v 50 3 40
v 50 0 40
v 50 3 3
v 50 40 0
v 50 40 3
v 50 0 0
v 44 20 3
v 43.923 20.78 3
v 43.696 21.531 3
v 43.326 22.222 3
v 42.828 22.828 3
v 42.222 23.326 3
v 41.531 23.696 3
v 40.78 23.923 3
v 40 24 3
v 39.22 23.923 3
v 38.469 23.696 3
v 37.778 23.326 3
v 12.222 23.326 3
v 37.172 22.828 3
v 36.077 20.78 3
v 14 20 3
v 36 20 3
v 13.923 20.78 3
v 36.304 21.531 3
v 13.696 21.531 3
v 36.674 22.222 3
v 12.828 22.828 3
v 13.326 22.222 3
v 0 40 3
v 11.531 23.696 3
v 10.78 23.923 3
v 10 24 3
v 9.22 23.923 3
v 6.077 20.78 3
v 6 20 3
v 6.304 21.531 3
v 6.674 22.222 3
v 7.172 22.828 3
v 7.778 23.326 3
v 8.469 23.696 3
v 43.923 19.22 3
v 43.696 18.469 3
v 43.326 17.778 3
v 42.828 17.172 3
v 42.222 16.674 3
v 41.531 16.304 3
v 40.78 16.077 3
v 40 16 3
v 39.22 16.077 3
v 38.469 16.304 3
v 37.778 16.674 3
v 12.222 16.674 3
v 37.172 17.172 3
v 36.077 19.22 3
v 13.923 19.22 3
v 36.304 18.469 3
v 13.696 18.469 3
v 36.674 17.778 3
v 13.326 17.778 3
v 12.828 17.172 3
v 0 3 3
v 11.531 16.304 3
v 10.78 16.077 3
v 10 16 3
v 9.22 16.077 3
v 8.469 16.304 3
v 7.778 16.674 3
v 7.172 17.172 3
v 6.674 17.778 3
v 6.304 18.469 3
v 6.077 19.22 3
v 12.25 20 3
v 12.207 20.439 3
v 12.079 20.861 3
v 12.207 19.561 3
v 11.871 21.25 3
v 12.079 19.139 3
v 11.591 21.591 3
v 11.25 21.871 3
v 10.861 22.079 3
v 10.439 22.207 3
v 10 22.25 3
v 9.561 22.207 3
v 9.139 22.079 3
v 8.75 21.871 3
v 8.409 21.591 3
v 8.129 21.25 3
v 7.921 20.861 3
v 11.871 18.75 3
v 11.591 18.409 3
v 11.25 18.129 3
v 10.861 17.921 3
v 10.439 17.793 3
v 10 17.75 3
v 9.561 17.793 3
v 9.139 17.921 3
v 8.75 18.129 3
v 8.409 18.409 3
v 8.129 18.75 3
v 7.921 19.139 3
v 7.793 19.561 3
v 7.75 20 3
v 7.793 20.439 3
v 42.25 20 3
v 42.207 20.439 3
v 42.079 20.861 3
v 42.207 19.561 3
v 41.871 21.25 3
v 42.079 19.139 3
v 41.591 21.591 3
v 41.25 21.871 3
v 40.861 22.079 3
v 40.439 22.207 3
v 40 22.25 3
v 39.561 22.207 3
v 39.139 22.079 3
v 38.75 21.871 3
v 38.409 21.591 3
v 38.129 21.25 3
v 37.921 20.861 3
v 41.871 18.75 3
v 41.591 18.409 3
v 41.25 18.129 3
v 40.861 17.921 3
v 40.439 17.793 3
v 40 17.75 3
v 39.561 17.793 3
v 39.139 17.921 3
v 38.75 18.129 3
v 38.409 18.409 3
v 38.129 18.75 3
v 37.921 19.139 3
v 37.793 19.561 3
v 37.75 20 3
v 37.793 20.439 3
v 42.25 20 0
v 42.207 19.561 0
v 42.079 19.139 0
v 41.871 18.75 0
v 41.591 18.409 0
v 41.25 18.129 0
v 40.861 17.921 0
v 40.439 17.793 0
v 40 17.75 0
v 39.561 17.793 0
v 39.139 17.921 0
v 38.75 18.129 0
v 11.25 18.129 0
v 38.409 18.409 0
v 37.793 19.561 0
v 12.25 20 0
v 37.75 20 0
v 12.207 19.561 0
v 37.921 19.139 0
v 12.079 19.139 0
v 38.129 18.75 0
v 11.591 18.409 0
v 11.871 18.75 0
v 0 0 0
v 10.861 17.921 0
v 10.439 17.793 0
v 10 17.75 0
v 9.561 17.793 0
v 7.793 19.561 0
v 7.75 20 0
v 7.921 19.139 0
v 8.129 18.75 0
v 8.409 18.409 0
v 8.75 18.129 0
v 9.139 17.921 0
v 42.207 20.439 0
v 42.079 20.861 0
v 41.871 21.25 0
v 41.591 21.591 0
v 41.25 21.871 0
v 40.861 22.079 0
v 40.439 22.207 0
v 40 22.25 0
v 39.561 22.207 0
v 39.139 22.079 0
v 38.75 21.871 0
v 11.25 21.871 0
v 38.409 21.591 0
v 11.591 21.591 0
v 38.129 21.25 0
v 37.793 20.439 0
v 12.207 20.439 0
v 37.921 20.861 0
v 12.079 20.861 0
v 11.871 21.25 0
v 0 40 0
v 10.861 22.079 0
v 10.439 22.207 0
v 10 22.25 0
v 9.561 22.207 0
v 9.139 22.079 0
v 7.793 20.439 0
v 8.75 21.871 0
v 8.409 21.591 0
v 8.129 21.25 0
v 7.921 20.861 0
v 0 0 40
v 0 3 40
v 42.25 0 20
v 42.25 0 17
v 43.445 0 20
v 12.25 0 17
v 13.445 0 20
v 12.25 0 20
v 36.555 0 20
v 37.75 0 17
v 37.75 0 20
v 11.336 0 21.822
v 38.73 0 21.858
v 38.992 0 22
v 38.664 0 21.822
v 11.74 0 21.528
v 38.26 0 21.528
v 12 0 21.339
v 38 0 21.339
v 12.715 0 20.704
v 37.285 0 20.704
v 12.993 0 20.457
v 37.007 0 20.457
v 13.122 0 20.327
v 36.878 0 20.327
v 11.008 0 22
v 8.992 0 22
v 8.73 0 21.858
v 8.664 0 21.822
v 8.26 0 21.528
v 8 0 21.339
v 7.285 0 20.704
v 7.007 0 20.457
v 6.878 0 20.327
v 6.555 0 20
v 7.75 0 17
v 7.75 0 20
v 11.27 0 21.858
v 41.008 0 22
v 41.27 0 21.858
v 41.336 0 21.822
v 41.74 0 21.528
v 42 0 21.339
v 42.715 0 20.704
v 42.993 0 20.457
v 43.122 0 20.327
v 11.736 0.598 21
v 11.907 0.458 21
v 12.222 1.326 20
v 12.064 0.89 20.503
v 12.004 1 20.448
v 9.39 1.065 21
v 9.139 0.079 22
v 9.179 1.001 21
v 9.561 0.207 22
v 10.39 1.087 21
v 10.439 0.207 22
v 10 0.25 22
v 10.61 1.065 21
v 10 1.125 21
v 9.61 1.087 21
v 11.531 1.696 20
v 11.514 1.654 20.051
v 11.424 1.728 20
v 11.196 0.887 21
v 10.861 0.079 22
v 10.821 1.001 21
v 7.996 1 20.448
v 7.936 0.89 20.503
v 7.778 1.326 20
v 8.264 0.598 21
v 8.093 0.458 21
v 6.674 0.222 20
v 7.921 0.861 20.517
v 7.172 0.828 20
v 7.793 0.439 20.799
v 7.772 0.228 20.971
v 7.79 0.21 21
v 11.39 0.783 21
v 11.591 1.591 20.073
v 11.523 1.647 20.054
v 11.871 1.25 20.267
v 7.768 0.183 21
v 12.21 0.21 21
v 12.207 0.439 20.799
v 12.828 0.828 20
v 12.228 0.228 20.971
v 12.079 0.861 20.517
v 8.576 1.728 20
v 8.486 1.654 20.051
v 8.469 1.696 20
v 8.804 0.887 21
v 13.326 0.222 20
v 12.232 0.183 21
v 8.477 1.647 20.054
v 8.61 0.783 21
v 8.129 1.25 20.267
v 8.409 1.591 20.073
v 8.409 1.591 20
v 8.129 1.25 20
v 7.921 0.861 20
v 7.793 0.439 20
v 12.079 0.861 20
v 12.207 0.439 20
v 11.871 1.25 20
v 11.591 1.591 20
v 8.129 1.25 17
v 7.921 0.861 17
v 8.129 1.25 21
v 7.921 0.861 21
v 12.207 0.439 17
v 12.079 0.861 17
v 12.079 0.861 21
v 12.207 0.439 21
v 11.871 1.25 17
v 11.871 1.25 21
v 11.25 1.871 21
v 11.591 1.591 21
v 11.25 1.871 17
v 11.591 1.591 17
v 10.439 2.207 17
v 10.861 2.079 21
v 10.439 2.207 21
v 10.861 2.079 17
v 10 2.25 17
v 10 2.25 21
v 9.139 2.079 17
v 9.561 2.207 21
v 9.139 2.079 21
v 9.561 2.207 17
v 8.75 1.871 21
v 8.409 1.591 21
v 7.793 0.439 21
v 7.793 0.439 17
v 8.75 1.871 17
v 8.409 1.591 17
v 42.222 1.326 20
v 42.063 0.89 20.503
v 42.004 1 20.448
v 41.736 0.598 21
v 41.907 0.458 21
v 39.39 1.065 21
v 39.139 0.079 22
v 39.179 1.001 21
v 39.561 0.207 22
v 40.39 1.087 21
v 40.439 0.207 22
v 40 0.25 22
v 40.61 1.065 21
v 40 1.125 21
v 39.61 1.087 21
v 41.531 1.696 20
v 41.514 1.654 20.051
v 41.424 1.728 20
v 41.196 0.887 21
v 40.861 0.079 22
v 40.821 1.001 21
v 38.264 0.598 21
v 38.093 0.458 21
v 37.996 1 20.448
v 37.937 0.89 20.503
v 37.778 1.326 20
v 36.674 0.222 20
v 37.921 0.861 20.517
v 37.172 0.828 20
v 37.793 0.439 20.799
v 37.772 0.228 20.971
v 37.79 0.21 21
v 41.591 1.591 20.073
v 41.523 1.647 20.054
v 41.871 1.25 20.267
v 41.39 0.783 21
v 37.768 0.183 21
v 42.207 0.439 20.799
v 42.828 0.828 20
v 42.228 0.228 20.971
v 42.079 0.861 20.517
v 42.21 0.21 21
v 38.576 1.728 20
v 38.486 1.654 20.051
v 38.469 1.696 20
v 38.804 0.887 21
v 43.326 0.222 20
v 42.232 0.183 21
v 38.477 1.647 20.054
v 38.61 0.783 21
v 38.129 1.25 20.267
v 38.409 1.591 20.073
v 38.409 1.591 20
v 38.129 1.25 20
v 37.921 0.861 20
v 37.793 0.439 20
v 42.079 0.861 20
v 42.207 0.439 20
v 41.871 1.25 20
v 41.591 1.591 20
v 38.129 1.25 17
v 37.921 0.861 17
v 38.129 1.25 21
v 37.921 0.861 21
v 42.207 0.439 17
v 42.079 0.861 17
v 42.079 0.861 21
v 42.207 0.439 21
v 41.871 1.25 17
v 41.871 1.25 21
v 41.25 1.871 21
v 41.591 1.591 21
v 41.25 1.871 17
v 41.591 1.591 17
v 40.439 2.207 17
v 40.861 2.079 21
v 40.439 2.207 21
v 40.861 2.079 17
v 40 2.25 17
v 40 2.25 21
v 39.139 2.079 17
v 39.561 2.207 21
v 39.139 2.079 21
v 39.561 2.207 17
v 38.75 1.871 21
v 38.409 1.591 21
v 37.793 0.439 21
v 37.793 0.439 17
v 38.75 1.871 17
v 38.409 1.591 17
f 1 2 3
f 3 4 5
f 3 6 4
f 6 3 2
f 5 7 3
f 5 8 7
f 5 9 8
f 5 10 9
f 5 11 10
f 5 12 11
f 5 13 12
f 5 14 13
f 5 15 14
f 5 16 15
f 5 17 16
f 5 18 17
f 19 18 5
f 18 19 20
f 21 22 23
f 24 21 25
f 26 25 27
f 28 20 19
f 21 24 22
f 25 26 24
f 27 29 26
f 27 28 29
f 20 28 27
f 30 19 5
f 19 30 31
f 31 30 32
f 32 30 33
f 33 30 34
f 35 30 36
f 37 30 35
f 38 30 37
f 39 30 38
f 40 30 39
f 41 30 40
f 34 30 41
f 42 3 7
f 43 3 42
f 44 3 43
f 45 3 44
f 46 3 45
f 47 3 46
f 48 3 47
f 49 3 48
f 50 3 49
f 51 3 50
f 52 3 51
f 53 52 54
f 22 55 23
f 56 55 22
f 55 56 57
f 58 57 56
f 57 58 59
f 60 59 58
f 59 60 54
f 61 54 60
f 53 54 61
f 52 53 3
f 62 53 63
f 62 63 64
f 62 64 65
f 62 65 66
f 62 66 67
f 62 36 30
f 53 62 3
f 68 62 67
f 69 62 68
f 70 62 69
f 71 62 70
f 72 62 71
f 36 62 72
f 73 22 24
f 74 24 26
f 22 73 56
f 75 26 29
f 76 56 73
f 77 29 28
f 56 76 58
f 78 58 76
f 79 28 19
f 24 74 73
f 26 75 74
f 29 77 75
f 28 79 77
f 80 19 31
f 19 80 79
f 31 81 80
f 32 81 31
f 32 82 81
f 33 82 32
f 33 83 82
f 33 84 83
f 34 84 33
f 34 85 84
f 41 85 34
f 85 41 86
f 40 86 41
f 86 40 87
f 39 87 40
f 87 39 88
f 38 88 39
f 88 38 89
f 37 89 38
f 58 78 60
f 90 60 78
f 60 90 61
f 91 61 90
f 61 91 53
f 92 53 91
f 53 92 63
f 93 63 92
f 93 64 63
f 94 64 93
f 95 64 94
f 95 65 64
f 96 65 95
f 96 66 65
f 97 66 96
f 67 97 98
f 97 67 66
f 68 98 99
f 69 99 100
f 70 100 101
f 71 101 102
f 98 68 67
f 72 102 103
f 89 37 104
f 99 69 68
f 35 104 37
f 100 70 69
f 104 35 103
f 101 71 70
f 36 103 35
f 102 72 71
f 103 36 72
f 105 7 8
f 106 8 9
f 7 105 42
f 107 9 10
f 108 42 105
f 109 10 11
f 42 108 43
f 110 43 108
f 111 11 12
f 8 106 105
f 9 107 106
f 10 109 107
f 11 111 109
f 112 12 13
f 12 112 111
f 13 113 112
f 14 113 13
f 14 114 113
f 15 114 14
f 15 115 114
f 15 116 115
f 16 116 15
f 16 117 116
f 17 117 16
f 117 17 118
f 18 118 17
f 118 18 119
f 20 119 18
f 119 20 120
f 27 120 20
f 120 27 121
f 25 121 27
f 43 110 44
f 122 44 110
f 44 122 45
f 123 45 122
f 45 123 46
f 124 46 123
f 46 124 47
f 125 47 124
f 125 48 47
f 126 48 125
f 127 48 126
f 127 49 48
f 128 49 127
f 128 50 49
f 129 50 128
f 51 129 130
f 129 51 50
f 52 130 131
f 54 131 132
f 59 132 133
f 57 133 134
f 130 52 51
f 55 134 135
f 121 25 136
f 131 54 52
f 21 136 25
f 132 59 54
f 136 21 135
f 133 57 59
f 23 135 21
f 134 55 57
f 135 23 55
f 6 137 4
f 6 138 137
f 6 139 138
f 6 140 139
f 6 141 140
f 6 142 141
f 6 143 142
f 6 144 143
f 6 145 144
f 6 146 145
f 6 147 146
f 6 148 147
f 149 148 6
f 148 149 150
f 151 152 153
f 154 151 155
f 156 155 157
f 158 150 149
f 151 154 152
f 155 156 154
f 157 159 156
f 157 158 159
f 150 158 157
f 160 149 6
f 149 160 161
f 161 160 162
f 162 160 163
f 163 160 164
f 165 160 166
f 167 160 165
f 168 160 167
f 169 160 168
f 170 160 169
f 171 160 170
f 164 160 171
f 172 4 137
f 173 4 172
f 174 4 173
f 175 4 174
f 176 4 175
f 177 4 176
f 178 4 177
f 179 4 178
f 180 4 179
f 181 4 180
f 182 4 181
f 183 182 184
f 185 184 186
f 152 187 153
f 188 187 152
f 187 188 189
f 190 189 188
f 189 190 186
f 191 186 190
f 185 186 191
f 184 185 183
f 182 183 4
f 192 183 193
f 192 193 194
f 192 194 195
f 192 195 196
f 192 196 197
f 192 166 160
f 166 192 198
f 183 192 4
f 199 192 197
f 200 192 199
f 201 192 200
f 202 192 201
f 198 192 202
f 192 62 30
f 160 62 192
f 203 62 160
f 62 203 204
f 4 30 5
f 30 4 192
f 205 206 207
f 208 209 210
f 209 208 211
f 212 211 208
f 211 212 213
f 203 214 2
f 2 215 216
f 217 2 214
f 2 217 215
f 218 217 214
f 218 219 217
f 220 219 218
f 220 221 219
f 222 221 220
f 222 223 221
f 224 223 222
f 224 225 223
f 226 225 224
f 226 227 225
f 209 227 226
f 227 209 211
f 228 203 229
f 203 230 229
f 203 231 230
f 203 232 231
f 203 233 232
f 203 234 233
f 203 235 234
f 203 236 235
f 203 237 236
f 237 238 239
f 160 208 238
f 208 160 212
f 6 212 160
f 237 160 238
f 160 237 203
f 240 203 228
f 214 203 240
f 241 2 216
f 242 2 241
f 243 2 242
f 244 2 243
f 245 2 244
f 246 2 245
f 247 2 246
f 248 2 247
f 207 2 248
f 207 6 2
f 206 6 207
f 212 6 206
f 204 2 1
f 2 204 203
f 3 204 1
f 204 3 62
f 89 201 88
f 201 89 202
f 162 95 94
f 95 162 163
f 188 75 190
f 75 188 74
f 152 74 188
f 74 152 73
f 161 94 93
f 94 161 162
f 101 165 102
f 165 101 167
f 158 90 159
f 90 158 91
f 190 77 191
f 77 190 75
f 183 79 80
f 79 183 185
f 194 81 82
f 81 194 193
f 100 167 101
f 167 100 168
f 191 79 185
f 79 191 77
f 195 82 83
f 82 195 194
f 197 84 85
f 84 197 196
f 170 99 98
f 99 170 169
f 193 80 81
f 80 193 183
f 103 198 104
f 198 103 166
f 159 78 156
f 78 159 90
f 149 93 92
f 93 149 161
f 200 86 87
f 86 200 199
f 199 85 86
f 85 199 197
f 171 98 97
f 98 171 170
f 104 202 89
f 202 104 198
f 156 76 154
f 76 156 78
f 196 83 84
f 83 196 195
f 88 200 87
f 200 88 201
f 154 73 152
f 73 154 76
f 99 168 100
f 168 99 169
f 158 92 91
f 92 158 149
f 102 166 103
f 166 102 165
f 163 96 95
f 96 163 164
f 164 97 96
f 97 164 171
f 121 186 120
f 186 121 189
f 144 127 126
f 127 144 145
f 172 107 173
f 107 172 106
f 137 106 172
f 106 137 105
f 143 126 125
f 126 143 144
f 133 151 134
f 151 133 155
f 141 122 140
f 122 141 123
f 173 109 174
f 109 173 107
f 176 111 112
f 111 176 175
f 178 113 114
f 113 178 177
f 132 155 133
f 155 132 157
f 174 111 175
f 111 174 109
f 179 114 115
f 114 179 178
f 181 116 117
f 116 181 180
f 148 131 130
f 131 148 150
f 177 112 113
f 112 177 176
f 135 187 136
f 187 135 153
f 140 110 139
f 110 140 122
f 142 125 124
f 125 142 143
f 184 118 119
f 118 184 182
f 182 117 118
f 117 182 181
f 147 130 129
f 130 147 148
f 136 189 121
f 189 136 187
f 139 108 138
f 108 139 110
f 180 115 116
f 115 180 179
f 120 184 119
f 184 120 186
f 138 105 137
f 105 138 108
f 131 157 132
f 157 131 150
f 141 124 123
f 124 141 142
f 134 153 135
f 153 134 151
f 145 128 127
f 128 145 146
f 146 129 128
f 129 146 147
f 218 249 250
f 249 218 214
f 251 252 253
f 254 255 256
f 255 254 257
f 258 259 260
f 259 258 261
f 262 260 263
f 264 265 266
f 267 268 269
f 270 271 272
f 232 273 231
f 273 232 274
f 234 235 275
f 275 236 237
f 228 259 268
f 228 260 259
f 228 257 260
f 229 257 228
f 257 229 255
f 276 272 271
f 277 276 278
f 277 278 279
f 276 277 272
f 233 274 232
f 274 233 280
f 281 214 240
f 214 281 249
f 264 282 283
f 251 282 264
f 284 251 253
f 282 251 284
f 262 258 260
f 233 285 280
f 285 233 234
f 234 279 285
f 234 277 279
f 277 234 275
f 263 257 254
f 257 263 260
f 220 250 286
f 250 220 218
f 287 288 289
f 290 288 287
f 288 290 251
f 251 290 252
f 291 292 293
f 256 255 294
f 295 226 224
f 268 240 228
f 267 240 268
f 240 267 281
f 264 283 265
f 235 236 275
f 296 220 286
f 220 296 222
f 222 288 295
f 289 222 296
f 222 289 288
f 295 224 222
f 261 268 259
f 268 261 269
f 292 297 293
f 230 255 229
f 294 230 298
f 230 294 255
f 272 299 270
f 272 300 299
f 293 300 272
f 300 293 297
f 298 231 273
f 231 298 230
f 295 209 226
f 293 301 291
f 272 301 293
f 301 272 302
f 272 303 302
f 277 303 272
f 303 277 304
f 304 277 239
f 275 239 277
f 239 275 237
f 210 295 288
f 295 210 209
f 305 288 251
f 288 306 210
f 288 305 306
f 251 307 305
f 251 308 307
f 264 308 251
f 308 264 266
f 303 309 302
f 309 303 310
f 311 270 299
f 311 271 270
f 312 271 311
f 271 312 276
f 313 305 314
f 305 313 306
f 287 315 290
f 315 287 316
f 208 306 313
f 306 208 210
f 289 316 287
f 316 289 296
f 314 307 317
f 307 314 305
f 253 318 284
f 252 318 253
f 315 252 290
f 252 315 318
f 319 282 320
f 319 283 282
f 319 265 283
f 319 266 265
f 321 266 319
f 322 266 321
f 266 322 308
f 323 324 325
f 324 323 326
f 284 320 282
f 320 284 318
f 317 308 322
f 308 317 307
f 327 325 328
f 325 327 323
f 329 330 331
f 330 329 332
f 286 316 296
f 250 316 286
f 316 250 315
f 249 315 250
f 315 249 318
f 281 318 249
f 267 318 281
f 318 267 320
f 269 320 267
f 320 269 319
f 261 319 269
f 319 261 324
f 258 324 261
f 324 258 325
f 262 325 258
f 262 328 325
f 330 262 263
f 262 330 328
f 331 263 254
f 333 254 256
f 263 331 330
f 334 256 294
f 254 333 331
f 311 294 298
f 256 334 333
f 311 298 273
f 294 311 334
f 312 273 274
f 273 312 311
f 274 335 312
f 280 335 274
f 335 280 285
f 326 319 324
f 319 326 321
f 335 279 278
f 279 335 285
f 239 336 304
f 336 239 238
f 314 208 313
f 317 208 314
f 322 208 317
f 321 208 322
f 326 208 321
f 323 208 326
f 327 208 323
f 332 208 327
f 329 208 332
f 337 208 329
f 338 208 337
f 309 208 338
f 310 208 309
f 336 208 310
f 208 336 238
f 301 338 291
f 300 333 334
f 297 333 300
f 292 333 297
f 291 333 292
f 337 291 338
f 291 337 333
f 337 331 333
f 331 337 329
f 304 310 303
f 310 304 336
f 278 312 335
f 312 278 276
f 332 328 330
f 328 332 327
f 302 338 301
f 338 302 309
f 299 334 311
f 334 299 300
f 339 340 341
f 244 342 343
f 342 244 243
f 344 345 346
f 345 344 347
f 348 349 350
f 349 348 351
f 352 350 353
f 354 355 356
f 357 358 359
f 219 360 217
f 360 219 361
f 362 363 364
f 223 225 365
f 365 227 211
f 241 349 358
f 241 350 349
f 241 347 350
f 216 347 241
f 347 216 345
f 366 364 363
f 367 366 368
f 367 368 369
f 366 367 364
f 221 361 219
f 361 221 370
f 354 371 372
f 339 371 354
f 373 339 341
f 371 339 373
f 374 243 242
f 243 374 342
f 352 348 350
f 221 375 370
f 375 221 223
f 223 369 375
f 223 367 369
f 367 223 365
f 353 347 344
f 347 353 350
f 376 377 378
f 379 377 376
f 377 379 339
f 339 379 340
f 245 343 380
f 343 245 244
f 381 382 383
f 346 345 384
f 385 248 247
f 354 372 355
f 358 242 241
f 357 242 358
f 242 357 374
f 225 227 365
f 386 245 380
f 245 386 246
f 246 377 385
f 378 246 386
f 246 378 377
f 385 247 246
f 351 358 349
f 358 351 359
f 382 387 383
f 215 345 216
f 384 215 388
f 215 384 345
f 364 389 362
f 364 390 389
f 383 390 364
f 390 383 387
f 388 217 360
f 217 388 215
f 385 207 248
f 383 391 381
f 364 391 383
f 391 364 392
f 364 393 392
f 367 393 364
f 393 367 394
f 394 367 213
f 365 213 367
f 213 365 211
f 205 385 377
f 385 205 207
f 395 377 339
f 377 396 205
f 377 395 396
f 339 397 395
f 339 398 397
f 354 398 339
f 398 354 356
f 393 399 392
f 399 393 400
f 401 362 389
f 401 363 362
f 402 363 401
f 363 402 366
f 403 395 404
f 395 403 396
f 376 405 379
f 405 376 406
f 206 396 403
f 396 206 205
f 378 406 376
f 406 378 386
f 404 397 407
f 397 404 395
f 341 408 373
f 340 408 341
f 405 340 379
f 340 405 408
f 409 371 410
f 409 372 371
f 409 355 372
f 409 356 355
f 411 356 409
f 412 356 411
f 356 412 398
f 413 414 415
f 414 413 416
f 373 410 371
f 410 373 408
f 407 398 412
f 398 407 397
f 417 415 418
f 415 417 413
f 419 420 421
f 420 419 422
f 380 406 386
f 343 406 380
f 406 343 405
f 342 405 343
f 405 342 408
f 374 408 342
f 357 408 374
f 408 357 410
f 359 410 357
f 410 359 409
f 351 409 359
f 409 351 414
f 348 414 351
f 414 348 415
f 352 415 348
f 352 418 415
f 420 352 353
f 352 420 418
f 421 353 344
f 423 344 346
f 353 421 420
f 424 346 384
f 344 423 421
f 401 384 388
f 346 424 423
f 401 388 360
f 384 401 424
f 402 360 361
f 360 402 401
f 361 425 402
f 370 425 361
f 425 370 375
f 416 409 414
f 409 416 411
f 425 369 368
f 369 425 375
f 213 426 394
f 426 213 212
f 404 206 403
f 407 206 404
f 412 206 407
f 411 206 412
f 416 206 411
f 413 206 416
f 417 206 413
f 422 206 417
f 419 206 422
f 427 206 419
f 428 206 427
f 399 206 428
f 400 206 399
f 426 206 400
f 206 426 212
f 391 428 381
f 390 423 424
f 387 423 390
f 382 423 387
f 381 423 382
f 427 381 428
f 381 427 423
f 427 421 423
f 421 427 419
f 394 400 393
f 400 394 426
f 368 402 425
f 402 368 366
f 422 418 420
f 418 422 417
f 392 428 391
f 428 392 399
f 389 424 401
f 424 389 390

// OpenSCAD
// L-bracket parameters
width = 50;
depth = 40;
height = 40;
thickness = 3;

// Hole parameters
hole_diameter = 4.5;
countersink_diameter = 8;
countersink_depth = 2;

// Final assembly
difference() {
    // Bracket geometry
    union() {
        // Horizontal plate: occupies X [0,50], Y [0,40], Z [0,3]
        // The large face is the top surface (XY plane at Z=thickness)
        cube([width, depth, thickness]);
        
        // Vertical plate: occupies X [0,50], Y [0,3], Z [0,40]
        // The large face is the front surface (XZ plane at Y=0)
        cube([width, thickness, height]);
    }

    // Holes on the Horizontal face (Top surface: Z = thickness)
    // Center line of Depth (Y) is depth / 2 = 20
    // Symmetrical X positions: 10mm and (width - 10) = 40mm
    for (x = [10, width - 10]) {
        translate([x, depth / 2, thickness]) {
            // Countersink seat (pointing outward in +Z direction)
            cylinder(d1=countersink_diameter, d2=hole_diameter, h=countersink_depth, $fn=32);
            // Through hole (inward in -Z direction)
            translate([0, 0, -thickness]) 
                cylinder(d=hole_diameter, h=thickness + 1, $fn=32);
        }
    }

    // Holes on the Vertical face (Front surface: Y = 0)
    // Center line of Height (Z) is height / 2 = 20
    // Symmetrical X positions: 10mm and (width - 10) = 40mm
    for (x = [10, width - 10]) {
        translate([x, 0, height / 2]) {
            // Countersink seat (pointing outward in -Y direction)
            translate([0, -countersink_depth, 0])
                cylinder(d1=countersink_diameter, d2=hole_diameter, h=countersink_depth, $fn=32);
            // Through hole (inward in +Y direction)
            translate([0, 0, -thickness]) 
                cylinder(d=hole_diameter, h=thickness + 1, $fn=32);
        }
    }
}
